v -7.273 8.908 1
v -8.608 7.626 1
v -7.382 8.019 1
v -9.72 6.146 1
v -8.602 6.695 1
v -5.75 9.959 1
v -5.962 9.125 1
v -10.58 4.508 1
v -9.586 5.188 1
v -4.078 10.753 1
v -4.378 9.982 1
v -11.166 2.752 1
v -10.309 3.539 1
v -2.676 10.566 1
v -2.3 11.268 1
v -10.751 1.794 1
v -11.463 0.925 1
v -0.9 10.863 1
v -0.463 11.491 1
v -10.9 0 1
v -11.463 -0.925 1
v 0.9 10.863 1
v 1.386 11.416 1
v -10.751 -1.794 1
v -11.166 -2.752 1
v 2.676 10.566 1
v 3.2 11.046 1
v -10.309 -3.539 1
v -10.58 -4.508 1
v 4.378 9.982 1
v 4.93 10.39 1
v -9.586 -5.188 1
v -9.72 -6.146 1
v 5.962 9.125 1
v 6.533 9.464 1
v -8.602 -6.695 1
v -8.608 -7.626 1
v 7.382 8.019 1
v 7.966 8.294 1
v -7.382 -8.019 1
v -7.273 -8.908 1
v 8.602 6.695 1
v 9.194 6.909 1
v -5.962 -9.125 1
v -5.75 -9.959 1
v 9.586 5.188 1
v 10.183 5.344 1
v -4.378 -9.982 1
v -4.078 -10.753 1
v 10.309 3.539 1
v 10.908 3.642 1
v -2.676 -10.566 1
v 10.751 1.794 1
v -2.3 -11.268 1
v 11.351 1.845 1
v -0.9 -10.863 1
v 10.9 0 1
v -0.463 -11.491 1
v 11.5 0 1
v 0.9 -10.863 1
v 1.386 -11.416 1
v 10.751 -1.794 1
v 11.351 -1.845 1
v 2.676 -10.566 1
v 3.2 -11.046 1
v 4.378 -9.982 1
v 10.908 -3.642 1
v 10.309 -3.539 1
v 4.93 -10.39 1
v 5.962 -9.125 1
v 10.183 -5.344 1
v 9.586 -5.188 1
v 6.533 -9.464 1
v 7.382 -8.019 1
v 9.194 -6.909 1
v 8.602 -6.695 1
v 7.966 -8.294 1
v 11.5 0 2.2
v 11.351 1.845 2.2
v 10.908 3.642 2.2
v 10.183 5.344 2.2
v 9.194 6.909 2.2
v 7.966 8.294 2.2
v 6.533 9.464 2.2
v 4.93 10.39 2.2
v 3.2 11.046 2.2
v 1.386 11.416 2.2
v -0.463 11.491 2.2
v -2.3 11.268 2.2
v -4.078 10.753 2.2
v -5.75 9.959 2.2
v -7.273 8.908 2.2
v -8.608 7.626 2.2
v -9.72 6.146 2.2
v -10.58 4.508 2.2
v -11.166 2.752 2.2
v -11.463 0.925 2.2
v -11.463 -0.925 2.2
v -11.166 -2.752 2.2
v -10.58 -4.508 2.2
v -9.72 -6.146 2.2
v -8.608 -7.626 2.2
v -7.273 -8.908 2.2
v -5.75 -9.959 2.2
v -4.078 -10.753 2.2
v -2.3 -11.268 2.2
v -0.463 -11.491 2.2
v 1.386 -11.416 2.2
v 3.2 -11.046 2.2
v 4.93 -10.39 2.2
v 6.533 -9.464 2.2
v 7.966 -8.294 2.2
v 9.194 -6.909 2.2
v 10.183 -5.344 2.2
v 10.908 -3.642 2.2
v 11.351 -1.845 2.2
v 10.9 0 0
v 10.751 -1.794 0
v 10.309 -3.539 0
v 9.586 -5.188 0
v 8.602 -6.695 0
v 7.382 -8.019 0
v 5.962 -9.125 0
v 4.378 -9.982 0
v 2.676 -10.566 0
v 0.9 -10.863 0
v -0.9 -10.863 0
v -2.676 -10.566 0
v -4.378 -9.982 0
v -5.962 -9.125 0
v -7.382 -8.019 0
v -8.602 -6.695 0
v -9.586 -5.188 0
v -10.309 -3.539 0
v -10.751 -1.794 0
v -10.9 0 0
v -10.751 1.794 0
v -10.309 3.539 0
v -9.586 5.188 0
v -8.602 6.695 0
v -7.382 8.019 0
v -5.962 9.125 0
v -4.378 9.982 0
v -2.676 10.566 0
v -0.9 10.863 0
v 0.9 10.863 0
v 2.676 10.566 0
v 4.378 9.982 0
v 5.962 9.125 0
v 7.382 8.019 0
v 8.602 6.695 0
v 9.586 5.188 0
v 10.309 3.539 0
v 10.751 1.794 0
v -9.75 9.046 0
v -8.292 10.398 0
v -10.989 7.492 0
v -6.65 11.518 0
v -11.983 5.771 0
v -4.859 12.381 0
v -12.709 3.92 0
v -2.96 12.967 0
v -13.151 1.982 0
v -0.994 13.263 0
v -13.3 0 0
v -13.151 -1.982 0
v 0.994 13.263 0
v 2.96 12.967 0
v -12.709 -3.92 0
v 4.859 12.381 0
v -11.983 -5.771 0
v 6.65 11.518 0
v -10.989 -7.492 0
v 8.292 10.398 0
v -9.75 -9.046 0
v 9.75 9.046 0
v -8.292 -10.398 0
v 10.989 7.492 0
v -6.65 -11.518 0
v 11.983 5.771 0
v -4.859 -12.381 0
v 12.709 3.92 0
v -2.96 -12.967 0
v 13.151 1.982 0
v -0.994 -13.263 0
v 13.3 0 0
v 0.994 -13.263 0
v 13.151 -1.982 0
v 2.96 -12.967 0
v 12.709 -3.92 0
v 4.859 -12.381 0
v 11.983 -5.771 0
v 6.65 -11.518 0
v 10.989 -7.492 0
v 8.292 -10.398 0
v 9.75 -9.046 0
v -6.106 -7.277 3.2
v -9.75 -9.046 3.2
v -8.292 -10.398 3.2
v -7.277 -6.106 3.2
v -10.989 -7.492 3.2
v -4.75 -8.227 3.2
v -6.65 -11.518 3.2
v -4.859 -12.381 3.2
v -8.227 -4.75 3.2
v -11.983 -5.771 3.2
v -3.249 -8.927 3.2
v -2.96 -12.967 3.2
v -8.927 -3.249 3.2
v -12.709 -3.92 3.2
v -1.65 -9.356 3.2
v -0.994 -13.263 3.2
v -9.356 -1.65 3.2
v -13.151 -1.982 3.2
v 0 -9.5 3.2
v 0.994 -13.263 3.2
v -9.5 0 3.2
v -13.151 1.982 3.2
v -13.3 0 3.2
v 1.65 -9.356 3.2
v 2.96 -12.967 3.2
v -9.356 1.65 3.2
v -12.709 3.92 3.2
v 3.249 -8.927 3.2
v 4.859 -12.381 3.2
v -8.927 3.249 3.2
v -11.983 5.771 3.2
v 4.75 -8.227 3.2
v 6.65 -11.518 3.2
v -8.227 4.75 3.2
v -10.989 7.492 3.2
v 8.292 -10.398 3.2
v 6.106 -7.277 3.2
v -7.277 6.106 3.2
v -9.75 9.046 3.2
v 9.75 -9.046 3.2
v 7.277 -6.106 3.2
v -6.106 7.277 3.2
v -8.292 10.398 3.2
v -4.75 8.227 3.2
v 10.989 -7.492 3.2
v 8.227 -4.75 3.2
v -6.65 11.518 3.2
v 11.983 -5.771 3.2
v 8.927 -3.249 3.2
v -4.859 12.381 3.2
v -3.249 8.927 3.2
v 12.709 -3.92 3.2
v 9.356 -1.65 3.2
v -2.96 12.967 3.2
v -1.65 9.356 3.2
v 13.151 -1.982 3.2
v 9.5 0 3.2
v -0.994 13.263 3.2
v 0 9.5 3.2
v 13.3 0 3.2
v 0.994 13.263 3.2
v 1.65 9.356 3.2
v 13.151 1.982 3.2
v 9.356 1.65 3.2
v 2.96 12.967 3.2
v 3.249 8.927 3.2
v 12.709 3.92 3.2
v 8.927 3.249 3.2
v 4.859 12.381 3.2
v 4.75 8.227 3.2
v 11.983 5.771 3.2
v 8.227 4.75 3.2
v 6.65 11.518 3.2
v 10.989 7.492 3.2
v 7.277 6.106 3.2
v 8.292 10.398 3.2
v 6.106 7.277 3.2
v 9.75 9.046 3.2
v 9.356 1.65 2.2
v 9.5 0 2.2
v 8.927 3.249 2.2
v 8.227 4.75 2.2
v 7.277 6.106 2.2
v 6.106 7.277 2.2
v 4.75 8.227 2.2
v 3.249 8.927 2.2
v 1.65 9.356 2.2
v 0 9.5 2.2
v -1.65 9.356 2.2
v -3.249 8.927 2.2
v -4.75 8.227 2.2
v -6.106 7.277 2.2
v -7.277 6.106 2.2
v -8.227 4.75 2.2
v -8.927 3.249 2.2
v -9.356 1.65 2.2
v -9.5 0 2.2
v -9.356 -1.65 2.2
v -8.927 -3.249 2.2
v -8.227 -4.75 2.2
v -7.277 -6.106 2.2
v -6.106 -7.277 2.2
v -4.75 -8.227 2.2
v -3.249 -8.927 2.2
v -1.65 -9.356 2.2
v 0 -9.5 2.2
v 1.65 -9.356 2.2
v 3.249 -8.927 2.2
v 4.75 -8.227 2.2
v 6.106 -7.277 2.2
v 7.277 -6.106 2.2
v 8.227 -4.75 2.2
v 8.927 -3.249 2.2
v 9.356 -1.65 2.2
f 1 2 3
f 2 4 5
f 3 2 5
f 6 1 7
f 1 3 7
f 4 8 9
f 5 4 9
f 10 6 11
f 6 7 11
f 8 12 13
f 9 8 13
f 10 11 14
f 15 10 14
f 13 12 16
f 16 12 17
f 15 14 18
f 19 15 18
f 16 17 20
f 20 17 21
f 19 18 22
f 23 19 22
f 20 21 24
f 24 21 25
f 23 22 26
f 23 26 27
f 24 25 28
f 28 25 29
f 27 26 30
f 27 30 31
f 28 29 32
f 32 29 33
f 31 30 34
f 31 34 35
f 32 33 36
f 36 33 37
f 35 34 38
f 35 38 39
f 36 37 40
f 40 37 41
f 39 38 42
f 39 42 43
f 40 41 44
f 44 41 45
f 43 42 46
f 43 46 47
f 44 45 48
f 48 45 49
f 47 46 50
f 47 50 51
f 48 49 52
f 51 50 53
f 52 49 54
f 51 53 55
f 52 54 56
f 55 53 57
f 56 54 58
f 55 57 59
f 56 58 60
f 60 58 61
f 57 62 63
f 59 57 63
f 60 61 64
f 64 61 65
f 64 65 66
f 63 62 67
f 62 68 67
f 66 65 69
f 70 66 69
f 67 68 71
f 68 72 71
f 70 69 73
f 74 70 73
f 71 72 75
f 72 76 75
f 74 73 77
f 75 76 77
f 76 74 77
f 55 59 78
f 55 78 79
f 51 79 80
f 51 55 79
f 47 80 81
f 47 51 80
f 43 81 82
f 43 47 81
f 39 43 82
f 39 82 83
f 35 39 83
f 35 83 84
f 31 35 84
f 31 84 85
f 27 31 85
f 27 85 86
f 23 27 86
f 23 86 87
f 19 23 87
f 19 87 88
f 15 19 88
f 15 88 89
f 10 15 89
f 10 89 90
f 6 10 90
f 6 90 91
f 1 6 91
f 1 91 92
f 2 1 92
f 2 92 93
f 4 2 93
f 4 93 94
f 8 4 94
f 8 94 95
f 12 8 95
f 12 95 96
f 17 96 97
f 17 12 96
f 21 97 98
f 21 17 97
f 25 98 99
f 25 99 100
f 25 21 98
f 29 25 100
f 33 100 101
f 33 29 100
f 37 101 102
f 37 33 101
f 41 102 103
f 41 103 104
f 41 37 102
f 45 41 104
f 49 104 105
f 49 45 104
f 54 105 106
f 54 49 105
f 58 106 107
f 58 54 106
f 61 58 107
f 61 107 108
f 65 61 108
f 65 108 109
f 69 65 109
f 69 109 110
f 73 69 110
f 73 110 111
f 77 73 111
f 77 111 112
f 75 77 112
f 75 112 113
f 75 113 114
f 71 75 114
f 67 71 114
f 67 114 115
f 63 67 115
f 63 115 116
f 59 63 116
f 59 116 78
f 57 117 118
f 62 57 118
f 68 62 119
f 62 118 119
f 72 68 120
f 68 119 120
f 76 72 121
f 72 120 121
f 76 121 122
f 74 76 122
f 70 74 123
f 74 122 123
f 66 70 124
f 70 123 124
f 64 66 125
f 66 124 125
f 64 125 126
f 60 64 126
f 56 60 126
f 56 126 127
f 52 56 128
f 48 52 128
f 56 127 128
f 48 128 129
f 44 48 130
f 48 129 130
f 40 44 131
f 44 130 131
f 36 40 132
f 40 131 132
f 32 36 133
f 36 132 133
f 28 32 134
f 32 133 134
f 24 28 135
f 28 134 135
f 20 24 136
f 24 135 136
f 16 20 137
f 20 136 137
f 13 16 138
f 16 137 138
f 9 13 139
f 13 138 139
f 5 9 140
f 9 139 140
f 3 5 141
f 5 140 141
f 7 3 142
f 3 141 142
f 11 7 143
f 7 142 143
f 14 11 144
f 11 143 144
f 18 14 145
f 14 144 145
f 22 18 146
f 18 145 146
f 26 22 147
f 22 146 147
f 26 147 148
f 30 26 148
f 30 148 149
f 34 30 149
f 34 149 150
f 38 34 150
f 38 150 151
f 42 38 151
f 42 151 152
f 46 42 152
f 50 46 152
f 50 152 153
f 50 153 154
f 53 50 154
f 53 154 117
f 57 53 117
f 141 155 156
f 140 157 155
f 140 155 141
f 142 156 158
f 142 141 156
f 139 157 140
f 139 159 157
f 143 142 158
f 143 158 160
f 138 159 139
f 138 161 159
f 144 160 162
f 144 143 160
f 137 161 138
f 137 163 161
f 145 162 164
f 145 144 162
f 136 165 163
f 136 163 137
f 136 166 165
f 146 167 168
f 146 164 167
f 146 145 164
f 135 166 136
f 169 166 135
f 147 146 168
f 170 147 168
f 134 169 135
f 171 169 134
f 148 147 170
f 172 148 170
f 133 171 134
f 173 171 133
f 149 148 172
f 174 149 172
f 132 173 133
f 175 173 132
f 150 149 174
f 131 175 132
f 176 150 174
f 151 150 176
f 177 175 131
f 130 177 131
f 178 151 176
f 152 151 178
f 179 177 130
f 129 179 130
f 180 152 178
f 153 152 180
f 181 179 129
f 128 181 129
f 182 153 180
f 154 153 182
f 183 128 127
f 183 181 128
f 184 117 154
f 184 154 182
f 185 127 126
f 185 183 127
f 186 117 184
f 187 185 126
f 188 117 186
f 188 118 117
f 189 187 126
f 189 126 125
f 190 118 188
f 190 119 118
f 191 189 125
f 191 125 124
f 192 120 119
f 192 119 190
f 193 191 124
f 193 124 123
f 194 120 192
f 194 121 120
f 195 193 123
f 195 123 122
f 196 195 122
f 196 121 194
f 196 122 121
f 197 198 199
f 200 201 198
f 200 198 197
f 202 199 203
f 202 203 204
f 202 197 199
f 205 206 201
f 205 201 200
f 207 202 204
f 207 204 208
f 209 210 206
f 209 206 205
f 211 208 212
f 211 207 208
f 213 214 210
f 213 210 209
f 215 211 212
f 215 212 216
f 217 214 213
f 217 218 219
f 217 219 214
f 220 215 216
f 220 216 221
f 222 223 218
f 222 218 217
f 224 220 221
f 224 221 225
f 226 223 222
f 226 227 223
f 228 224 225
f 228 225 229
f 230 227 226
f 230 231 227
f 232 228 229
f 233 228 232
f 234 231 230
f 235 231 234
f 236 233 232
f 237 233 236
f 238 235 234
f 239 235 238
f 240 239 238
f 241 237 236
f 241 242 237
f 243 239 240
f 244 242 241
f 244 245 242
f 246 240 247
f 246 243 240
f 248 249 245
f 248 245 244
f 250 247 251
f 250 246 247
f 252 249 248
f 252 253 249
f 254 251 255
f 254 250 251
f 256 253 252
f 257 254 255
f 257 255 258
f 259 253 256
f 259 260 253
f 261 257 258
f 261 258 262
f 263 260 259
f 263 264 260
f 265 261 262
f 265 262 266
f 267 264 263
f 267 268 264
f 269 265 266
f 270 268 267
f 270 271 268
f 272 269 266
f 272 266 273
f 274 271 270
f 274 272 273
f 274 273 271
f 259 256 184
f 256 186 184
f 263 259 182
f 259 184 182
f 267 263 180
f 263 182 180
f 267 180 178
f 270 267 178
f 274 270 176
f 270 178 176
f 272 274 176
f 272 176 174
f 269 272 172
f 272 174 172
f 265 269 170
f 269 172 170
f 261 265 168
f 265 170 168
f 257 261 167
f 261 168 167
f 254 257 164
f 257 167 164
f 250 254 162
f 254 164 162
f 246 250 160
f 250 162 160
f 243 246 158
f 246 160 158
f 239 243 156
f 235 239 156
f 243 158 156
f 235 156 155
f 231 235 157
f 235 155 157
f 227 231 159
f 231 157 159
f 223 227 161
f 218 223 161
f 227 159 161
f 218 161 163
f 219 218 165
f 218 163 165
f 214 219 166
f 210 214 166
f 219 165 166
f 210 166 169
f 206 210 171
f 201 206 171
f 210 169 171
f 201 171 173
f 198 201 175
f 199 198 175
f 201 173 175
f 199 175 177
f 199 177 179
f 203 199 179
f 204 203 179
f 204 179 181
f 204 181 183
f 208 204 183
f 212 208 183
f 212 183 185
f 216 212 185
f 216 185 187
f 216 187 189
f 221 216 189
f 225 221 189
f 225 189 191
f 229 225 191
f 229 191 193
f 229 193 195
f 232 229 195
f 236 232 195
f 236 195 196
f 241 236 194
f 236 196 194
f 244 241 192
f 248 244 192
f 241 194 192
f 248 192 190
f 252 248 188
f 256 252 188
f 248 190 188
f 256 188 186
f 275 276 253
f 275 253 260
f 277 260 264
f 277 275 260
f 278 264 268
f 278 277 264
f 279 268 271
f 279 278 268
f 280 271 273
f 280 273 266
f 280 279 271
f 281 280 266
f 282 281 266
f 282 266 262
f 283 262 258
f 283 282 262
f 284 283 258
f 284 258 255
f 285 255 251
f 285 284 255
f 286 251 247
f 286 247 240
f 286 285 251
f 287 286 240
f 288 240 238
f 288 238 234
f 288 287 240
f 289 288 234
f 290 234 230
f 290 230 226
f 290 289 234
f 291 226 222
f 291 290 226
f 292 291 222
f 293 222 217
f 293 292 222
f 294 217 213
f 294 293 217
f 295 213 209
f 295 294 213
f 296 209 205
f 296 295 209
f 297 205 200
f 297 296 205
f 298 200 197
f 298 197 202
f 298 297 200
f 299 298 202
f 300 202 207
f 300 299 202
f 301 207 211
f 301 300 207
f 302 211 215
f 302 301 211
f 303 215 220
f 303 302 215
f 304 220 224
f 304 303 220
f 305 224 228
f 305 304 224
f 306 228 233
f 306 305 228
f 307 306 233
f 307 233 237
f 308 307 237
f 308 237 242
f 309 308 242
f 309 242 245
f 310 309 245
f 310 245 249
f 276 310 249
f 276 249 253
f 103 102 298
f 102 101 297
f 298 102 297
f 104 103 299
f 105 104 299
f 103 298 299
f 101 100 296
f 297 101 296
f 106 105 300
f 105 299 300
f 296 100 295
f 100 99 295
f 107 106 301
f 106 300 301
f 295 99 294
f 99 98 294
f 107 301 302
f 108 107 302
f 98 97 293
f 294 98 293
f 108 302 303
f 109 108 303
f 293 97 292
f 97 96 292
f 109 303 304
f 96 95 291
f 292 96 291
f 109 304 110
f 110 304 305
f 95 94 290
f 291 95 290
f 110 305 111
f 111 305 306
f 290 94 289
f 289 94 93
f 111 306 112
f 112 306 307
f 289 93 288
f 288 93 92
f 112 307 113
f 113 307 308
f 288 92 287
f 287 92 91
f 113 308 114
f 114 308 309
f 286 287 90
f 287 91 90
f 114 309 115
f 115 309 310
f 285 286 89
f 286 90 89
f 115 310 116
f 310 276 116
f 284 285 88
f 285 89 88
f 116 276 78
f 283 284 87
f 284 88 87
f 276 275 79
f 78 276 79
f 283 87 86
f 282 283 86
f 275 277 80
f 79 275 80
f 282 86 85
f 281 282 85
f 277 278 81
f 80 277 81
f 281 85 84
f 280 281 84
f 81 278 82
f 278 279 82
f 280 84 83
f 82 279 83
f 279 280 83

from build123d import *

# Parameters (mm, degrees)
F0_R     = 13.3
F0_R_2   = 11.5
F1_DEPTH = 2.2
F2_R     = 13.3
F2_R_2   = 11.5
F2_R_3   = 9.5
F3_DEPTH = 1
F4_R     = 11.5
F4_R_2   = 10.9
F5_DEPTH = 1


with BuildPart() as f1:
    # F0 (on Top) → F1 (new body)
    with BuildSketch(Plane.XY):
        Circle(F0_R)
        Circle(F0_R_2, mode=Mode.SUBTRACT)
    extrude(amount=F1_DEPTH)

    # F2 (on face) → F3 (join)
    with BuildSketch(Plane.XY.offset(2.2)):
        Circle(F2_R)
        Circle(F2_R_2, mode=Mode.SUBTRACT)
        Circle(F2_R_2)
        Circle(F2_R_3, mode=Mode.SUBTRACT)
    extrude(amount=F3_DEPTH)

    # F4 (on face) → F5 (join)
    with BuildSketch(Plane(origin=(0, 0, 0), x_dir=(1, 0, 0), z_dir=(0, 0, -1))):
        Circle(F4_R)
        Circle(F4_R_2, mode=Mode.SUBTRACT)
    extrude(amount=-F5_DEPTH)


solid = f1.part
